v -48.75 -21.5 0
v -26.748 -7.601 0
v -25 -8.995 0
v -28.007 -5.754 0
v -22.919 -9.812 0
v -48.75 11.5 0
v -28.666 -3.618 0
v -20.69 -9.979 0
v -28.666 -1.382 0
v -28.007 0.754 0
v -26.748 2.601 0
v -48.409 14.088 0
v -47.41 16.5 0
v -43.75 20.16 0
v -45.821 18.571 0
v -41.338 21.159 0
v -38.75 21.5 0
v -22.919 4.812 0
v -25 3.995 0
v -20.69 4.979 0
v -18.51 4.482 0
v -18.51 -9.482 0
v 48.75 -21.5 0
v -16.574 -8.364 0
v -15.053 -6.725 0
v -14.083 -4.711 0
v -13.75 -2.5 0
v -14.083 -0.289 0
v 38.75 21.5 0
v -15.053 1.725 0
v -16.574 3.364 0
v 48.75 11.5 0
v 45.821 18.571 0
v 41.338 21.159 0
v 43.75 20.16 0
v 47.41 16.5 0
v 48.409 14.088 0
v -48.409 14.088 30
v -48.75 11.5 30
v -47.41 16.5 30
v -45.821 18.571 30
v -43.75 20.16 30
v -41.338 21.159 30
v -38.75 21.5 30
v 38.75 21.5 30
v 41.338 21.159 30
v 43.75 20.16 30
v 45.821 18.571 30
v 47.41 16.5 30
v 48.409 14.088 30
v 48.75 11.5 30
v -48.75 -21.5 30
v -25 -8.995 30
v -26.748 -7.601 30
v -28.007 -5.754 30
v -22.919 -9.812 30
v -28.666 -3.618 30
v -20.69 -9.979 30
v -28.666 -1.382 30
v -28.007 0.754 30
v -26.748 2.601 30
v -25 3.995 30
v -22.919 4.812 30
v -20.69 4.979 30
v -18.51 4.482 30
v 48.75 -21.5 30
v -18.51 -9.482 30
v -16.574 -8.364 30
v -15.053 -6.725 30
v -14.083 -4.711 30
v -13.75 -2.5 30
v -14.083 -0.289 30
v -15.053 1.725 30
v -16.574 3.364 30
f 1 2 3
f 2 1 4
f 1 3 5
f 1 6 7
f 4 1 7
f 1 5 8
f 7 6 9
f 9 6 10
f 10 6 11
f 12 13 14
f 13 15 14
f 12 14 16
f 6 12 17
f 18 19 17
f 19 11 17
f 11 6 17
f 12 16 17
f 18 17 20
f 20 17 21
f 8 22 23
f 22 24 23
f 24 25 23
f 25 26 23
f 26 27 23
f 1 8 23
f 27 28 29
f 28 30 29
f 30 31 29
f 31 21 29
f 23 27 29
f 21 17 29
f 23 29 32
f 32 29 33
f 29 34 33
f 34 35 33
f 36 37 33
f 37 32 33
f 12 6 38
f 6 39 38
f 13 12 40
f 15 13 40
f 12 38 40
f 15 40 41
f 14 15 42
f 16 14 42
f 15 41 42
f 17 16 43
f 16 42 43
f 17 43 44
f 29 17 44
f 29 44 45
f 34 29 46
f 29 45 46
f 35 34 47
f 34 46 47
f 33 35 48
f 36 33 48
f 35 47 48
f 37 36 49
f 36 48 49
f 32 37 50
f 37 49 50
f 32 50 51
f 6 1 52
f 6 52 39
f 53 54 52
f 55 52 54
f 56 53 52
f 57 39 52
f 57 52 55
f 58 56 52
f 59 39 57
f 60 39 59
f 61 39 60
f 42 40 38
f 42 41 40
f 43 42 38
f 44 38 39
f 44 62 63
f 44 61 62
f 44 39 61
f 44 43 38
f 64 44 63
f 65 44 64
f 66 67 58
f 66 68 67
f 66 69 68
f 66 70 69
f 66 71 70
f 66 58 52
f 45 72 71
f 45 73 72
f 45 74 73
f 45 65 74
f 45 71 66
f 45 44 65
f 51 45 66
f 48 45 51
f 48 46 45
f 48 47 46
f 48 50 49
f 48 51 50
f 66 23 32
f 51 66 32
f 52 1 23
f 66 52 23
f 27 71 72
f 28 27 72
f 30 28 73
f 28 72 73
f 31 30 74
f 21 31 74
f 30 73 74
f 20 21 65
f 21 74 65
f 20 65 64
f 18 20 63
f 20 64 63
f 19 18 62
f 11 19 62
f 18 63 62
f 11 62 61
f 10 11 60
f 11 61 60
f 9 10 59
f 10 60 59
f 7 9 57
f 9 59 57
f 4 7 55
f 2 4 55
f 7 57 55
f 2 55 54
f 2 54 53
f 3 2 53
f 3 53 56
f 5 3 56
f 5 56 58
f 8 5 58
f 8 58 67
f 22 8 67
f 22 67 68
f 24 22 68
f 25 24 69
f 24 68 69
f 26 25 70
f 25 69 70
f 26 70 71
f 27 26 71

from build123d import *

# Parameters (mm, degrees)
SZKIC1_W                    = 97.5
SZKIC1_H                    = 43
DODANIE_WYCI_GNI_CIE1_DEPTH = 30
ZAOKR_GLENIE1_R             = 10
ZAOKR_GLENIE2_R             = 10
SZKIC2_R                    = 7.5
WYTNIJ_WYCI_GNI_CIE1_DEPTH  = 30


with BuildPart() as part:
    # Szkic1 → Dodanie-wyciągnięcie1 (new body)
    with BuildSketch(Plane.XY):
        Rectangle(SZKIC1_W, SZKIC1_H)
    extrude(amount=DODANIE_WYCI_GNI_CIE1_DEPTH)

    # Zaokrąglenie1
    zaokr_glenie1_edges = [part.edges().sort_by_distance(p)[0] for p in [
        (-48.75, 21.5, 15),
    ]]
    fillet(zaokr_glenie1_edges, radius=ZAOKR_GLENIE1_R)

    # Zaokrąglenie2
    zaokr_glenie2_edges = [part.edges().sort_by_distance(p)[0] for p in [
        (48.75, 21.5, 15),
    ]]
    fillet(zaokr_glenie2_edges, radius=ZAOKR_GLENIE2_R)

    # Szkic2 → Wytnij-wyciągnięcie1 (cut)
    with BuildSketch(Plane.XY.offset(30)):
        with Locations((-21.25, -2.5)):
            Circle(SZKIC2_R)
    extrude(amount=-WYTNIJ_WYCI_GNI_CIE1_DEPTH, mode=Mode.SUBTRACT)


solid = part.part
